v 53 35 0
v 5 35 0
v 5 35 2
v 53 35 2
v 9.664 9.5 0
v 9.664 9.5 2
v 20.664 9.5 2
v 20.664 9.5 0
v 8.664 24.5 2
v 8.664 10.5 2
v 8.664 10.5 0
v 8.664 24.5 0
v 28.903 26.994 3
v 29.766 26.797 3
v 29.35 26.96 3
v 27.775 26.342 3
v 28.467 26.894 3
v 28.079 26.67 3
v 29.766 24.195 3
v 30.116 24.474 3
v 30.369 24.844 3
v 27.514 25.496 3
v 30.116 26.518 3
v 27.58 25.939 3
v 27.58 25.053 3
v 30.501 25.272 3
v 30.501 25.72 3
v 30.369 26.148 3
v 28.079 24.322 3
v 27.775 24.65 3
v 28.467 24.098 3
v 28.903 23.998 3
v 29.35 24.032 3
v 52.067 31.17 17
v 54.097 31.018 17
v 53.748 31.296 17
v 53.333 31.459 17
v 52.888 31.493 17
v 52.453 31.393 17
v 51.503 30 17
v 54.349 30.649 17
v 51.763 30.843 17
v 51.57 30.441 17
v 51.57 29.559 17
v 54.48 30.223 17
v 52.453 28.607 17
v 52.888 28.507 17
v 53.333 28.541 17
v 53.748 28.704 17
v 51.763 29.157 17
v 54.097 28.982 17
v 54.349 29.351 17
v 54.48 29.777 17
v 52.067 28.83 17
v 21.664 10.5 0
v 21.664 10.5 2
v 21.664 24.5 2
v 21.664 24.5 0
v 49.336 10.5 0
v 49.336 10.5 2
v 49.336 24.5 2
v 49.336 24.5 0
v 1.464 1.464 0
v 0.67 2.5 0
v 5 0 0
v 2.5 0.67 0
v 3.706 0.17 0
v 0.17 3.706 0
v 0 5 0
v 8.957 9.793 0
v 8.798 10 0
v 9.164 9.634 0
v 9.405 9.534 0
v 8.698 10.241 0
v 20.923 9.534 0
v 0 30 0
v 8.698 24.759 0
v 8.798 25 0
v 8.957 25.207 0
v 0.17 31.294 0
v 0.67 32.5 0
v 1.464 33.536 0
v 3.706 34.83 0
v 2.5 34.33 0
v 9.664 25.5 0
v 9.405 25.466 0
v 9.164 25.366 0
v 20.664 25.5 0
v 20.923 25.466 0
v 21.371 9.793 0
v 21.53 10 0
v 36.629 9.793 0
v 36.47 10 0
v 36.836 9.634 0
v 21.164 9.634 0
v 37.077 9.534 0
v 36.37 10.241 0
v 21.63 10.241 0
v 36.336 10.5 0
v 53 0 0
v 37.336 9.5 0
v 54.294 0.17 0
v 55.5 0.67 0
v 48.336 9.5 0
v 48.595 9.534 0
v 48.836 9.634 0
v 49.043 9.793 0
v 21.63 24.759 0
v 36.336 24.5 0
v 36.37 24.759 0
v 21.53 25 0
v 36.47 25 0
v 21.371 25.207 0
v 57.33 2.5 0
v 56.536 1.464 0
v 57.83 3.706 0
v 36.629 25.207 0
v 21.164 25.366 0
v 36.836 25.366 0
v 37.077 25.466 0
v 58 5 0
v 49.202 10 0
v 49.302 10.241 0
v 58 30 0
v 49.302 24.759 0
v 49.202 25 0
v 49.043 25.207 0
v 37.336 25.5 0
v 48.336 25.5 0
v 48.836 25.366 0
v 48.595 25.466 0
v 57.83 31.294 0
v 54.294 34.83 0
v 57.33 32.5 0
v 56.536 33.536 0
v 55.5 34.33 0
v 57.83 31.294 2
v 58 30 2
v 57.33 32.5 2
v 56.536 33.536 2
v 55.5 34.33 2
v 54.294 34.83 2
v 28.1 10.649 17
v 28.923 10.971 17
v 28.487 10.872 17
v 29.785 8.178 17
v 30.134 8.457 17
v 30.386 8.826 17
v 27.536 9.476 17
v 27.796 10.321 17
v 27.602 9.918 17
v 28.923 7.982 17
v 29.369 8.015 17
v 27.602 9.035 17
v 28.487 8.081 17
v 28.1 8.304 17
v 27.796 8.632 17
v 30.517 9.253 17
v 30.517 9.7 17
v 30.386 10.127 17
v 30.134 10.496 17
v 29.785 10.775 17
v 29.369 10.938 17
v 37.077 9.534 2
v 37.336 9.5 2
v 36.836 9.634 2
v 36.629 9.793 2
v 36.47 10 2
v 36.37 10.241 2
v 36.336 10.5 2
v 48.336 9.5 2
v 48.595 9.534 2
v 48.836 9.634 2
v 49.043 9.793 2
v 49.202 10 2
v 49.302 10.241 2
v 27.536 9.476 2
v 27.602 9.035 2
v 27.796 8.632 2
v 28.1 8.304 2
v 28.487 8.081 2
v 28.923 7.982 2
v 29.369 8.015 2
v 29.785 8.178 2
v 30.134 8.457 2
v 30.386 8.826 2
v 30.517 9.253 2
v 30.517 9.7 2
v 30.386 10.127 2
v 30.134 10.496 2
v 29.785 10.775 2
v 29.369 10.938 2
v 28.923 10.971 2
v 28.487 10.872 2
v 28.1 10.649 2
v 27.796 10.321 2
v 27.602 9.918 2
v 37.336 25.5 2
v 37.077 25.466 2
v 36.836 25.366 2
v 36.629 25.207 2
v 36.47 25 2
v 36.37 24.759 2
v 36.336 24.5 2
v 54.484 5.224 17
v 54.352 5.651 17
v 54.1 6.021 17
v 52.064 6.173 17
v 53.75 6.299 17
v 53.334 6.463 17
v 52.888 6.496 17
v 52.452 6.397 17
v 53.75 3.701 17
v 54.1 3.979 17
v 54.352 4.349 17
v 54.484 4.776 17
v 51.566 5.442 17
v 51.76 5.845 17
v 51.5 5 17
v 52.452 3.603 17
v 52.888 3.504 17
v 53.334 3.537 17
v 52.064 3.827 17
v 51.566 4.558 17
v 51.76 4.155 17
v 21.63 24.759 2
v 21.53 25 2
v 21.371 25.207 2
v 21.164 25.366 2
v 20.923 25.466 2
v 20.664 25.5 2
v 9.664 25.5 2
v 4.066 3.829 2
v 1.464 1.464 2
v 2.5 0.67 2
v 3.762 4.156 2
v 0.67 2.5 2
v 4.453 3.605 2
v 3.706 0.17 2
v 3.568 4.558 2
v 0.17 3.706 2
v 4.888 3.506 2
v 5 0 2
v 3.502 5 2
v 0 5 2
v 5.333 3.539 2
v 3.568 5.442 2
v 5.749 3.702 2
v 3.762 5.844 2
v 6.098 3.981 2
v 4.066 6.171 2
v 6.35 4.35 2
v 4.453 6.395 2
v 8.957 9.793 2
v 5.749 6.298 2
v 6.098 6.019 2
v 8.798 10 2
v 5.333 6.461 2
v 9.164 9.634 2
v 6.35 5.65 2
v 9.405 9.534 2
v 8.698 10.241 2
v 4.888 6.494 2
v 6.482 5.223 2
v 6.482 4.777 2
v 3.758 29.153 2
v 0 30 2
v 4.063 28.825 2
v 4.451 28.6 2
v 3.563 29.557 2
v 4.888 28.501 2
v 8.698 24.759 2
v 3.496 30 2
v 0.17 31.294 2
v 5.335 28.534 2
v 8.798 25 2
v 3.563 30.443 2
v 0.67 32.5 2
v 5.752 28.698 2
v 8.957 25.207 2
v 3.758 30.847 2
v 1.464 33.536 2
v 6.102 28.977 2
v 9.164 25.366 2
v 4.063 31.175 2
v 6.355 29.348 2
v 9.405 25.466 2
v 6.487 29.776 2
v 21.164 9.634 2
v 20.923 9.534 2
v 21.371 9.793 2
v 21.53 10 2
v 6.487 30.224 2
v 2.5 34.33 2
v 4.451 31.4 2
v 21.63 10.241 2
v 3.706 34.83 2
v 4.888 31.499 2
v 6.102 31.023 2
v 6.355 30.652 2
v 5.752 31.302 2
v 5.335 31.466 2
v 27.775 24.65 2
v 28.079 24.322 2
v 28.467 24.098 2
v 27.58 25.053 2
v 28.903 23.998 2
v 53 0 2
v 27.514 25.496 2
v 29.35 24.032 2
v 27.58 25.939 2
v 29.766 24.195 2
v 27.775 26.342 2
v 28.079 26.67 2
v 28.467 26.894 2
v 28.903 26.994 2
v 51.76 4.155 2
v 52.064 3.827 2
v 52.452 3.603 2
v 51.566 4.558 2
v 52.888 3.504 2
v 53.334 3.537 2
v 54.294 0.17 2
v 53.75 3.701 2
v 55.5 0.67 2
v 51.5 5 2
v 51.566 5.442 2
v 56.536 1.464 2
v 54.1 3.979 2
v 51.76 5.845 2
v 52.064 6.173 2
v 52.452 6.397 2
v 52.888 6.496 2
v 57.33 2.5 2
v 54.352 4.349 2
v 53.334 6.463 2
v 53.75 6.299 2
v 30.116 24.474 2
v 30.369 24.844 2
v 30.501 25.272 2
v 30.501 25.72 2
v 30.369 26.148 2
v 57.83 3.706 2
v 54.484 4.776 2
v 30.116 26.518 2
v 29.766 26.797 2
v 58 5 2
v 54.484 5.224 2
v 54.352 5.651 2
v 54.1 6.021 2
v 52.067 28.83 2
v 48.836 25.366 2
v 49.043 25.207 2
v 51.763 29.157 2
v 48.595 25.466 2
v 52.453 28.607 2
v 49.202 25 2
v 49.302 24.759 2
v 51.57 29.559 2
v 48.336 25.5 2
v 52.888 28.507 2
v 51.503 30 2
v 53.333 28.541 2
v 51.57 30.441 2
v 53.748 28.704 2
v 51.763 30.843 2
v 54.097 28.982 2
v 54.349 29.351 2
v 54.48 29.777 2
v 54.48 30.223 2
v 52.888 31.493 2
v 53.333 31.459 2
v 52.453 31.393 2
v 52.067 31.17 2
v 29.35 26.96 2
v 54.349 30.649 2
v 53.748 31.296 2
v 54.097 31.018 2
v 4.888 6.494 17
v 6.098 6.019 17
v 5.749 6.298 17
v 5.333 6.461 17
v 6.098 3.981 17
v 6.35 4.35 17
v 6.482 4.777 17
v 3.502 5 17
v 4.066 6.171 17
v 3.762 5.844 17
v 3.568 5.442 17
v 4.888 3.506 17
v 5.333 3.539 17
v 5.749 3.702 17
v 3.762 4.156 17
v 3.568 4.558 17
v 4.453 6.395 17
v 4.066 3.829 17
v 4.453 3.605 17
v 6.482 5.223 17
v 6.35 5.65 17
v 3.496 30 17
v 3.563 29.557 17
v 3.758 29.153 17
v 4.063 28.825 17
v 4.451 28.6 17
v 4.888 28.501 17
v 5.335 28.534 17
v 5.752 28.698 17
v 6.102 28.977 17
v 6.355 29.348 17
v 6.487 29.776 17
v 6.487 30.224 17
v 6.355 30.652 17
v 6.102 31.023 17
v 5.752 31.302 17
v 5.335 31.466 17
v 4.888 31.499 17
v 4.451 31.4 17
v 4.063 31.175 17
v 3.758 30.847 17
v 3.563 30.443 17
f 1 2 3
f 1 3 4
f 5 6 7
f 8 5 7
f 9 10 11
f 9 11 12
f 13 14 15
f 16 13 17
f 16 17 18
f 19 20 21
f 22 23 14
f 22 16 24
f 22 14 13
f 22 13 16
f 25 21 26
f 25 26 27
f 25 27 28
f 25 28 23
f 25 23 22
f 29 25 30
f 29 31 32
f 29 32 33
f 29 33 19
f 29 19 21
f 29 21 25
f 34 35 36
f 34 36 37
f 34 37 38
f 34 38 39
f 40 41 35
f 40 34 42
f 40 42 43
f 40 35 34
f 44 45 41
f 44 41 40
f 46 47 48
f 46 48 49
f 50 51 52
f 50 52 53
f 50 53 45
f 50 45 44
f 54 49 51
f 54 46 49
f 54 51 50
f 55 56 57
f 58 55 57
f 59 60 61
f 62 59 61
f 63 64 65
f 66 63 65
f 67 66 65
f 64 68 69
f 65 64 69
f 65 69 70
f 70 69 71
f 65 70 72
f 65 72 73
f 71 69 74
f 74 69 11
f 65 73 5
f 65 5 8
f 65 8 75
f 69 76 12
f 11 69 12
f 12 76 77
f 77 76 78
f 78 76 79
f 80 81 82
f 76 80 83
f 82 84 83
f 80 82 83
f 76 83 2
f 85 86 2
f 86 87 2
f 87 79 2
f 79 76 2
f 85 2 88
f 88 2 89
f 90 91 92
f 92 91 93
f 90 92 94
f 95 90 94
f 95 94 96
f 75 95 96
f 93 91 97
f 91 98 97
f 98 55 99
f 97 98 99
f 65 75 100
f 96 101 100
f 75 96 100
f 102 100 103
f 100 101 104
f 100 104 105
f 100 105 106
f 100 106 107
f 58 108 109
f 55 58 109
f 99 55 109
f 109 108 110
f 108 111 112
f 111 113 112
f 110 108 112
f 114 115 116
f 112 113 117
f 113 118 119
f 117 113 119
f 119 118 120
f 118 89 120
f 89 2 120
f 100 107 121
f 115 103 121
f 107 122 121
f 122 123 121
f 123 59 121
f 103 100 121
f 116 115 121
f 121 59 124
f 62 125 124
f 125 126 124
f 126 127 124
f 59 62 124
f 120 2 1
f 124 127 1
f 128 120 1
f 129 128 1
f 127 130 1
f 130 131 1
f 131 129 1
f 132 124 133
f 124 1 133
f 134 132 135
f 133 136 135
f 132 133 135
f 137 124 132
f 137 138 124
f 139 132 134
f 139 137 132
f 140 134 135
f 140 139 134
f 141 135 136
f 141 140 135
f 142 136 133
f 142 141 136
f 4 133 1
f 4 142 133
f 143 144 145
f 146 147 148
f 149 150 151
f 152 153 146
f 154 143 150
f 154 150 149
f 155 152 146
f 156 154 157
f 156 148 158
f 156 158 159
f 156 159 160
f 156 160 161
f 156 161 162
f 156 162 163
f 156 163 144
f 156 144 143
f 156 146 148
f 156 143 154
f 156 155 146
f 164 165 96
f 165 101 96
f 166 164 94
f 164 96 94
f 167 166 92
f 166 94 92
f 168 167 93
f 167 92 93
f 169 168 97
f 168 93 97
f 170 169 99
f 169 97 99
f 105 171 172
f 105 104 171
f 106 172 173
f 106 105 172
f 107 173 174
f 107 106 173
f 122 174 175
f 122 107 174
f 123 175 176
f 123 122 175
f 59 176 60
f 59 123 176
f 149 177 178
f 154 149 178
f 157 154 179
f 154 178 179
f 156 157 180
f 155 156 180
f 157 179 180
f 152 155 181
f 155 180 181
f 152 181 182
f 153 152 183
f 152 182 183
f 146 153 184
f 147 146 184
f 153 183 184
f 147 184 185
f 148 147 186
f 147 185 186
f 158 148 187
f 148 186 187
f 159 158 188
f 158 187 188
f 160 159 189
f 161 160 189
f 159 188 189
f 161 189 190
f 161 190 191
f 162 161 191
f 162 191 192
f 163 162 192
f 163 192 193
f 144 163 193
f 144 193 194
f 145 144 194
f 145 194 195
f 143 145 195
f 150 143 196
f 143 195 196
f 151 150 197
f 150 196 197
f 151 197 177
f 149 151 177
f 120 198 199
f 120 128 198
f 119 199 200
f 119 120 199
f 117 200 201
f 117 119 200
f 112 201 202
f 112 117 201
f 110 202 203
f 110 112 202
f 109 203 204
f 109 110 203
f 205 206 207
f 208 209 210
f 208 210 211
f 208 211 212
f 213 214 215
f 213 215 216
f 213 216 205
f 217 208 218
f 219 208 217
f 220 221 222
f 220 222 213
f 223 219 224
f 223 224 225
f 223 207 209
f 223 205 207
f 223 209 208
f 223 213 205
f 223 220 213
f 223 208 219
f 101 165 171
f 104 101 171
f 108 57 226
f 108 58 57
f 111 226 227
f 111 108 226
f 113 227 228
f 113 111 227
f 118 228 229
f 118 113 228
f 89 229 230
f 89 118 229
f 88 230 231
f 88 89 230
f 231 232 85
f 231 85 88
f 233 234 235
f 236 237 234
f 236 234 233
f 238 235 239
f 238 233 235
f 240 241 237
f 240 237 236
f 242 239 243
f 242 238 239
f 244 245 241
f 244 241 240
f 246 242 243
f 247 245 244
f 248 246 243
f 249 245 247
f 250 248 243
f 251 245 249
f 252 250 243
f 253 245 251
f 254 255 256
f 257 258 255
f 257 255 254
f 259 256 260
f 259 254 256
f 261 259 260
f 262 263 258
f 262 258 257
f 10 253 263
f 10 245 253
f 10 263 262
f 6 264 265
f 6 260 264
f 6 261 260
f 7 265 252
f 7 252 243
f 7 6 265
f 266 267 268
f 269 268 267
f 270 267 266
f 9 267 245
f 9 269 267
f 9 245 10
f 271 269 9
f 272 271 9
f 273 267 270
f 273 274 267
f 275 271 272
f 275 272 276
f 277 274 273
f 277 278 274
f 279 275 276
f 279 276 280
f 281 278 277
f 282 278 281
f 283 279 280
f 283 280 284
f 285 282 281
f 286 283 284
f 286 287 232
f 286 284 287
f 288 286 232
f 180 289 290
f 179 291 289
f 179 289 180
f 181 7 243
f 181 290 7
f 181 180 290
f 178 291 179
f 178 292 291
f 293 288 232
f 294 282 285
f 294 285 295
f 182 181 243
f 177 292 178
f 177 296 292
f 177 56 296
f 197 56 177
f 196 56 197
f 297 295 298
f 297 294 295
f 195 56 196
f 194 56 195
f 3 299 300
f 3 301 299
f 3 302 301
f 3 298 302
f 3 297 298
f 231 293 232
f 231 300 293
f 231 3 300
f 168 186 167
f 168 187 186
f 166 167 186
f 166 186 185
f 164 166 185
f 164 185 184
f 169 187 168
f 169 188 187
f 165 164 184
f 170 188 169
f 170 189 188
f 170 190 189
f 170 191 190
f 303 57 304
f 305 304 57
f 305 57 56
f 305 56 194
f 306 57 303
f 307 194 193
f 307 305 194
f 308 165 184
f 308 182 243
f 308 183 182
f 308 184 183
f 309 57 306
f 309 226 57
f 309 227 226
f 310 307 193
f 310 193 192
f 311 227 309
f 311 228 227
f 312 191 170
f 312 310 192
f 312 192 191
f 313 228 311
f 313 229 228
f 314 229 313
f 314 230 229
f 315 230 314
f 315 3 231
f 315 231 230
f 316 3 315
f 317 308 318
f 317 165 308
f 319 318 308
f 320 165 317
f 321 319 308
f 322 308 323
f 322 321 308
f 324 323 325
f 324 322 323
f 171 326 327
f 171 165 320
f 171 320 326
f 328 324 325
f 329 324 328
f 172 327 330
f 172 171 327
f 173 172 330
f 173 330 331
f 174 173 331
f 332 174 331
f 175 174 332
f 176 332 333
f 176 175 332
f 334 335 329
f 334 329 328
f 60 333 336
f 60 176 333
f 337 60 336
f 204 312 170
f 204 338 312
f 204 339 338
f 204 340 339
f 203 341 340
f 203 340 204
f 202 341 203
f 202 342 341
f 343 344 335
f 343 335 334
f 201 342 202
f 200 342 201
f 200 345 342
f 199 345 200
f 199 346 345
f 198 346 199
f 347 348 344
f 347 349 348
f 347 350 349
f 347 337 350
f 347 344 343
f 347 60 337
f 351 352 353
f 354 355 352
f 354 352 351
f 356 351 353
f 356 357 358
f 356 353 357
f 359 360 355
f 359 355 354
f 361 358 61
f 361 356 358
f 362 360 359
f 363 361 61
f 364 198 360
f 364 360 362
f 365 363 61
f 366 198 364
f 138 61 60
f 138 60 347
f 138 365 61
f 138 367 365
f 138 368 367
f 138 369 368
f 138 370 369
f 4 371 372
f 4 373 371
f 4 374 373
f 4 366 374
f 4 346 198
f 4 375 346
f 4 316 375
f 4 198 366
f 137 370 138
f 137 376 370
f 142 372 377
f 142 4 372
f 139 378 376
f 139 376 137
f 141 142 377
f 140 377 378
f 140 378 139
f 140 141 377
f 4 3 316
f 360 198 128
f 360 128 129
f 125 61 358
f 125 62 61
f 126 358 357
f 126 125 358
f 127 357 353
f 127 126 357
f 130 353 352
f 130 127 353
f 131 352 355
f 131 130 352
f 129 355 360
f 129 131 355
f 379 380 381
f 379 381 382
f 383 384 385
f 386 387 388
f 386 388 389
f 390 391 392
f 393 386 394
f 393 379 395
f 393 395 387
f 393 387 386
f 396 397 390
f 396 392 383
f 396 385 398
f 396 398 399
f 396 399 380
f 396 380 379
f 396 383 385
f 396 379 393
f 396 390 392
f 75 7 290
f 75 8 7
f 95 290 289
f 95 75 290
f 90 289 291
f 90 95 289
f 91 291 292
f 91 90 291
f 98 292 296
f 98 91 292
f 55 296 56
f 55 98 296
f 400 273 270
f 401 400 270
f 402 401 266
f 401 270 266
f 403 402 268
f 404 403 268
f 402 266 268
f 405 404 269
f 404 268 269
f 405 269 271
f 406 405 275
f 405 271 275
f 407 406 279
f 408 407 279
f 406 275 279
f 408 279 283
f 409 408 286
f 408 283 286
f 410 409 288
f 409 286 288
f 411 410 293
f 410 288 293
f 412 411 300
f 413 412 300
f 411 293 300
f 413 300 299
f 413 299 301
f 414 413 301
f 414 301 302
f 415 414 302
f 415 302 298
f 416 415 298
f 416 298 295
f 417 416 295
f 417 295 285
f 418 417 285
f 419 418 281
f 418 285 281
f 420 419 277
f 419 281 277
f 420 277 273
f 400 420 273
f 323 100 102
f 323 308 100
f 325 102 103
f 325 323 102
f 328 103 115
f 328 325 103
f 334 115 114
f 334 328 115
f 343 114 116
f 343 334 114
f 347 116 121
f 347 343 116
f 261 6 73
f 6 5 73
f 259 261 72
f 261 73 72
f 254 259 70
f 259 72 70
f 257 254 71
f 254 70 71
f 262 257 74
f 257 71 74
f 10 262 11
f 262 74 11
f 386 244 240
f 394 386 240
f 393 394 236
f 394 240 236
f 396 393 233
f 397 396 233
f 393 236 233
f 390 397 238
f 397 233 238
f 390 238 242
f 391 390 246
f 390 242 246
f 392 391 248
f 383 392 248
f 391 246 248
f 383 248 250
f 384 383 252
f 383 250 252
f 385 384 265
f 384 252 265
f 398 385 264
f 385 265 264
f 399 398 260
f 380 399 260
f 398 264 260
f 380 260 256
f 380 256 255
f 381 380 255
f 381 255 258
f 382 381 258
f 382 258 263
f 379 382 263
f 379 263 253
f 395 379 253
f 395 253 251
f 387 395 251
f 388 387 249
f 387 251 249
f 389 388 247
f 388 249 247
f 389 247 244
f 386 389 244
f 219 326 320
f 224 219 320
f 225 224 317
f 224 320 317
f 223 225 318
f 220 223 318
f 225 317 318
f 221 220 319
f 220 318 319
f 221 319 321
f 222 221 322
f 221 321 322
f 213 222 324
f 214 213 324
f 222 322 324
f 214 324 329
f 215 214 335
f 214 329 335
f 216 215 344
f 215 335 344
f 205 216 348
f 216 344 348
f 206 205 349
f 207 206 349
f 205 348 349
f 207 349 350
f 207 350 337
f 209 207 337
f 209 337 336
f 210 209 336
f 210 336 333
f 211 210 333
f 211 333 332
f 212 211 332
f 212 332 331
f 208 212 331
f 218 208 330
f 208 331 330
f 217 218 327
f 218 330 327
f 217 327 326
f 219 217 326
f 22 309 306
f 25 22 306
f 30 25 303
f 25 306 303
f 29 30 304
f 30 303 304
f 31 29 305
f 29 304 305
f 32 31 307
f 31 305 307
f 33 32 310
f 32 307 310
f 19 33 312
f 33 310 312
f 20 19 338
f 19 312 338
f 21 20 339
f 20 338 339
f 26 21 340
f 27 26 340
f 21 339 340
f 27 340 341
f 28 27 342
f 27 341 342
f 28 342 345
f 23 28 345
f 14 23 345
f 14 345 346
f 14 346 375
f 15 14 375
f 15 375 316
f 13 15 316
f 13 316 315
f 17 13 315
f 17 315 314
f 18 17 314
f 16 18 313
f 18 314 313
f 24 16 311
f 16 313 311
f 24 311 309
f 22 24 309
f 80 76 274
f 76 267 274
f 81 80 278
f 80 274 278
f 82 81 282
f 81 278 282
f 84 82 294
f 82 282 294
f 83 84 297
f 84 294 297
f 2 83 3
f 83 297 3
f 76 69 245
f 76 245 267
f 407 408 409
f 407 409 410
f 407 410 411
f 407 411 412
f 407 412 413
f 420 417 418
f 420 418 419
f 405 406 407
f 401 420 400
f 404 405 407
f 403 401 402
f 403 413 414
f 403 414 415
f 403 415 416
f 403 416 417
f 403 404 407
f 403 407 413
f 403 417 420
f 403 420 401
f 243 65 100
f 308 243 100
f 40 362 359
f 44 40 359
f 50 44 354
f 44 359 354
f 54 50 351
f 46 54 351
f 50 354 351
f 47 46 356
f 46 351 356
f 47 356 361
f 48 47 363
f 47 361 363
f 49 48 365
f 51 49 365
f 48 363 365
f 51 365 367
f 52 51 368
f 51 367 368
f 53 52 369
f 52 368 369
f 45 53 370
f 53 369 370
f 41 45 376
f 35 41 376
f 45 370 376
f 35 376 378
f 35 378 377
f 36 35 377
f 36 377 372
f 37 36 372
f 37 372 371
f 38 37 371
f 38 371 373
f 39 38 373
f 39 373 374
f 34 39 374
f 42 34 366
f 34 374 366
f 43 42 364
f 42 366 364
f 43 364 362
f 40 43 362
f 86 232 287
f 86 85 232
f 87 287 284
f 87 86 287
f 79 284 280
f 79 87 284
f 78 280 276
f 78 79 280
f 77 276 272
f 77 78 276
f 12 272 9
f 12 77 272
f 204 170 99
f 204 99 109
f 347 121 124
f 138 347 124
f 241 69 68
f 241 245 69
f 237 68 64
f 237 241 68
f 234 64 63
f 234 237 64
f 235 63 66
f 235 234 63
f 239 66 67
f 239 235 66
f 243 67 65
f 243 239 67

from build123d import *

# Parameters (mm, degrees)
SKIZZE1_W                        = 58
SKIZZE1_H                        = 35
AUFSATZ_LINEAR_AUSTRAGEN1_DEPTH  = 2
VERRUNDUNG1_R                    = 5
SKIZZE10_R                       = 1.496771876
AUFSATZ_LINEAR_AUSTRAGEN6_DEPTH  = 15
SKIZZE11_R                       = 1.503510887
AUFSATZ_LINEAR_AUSTRAGEN7_DEPTH  = 15
SKIZZE12_R                       = 1.498287051
AUFSATZ_LINEAR_AUSTRAGEN8_DEPTH  = 15
SKIZZE13_R                       = 1.500467236
AUFSATZ_LINEAR_AUSTRAGEN9_DEPTH  = 15
SKIZZE23_W                       = 13
SKIZZE23_H                       = 16
SCHNITT_LINEAR_AUSTRAGEN3_DEPTH  = 15
VERRUNDUNG4_R                    = 1
SKIZZE24_R                       = 1.501958256
AUFSATZ_LINEAR_AUSTRAGEN10_DEPTH = 1
SKIZZE26_R                       = 1.499079917
AUFSATZ_LINEAR_AUSTRAGEN11_DEPTH = 15


with BuildPart() as part:
    # Skizze1 → Aufsatz-Linear austragen1 (new body)
    with BuildSketch(Plane.XY):
        with Locations((29, 17.5)):
            Rectangle(SKIZZE1_W, SKIZZE1_H)
    extrude(amount=AUFSATZ_LINEAR_AUSTRAGEN1_DEPTH)

    # Verrundung1
    verrundung1_edges = [part.edges().sort_by_distance(p)[0] for p in [
        (58, 35, 1),
        (0, 0, 1),
        (0, 35, 1),
        (58, 0, 1),
    ]]
    fillet(verrundung1_edges, radius=VERRUNDUNG1_R)

    # Skizze10 → Aufsatz-Linear austragen6 (add)
    with BuildSketch(Plane.XY.offset(2)):
        with Locations((53, 30)):
            Circle(SKIZZE10_R)
    extrude(amount=AUFSATZ_LINEAR_AUSTRAGEN6_DEPTH)

    # Skizze11 → Aufsatz-Linear austragen7 (add)
    with BuildSketch(Plane.XY.offset(2)):
        with Locations((4.999967007, 30)):
            Circle(SKIZZE11_R)
    extrude(amount=AUFSATZ_LINEAR_AUSTRAGEN7_DEPTH)

    # Skizze12 → Aufsatz-Linear austragen8 (add)
    with BuildSketch(Plane.XY.offset(2)):
        with Locations((5, 5)):
            Circle(SKIZZE12_R)
    extrude(amount=AUFSATZ_LINEAR_AUSTRAGEN8_DEPTH)

    # Skizze13 → Aufsatz-Linear austragen9 (add)
    with BuildSketch(Plane.XY.offset(2)):
        with Locations((53, 5)):
            Circle(SKIZZE13_R)
    extrude(amount=AUFSATZ_LINEAR_AUSTRAGEN9_DEPTH)

    # Skizze23 → Schnitt-Linear austragen3 (cut)
    with BuildSketch(Plane.XY.offset(2)):
        with Locations((42.835818152, 17.5)):
            Rectangle(SKIZZE23_W, SKIZZE23_H)
        with Locations((15.164181848, 17.5)):
            Rectangle(SKIZZE23_W, SKIZZE23_H)
    extrude(amount=-SCHNITT_LINEAR_AUSTRAGEN3_DEPTH, mode=Mode.SUBTRACT)

    # Verrundung4
    verrundung4_edges = [part.edges().sort_by_distance(p)[0] for p in [
        (49.335818152, 9.5, 1),
        (21.664181848, 9.5, 1),
        (36.335818152, 9.5, 1),
        (8.664181848, 9.5, 1),
        (36.335818152, 25.5, 1),
        (49.335818152, 25.5, 1),
        (21.664181848, 25.5, 1),
        (8.664181848, 25.5, 1),
    ]]
    fillet(verrundung4_edges, radius=VERRUNDUNG4_R)

    # Skizze24 → Aufsatz-Linear austragen10 (add)
    with BuildSketch(Plane.XY.offset(2)):
        with Locations((29.015481973, 25.496020028)):
            Circle(SKIZZE24_R)
    extrude(amount=AUFSATZ_LINEAR_AUSTRAGEN10_DEPTH)

    # Skizze26 → Aufsatz-Linear austragen11 (add)
    with BuildSketch(Plane.XY.offset(2)):
        with Locations((29.034976799, 9.476495672)):
            Circle(SKIZZE26_R)
    extrude(amount=AUFSATZ_LINEAR_AUSTRAGEN11_DEPTH)


solid = part.part
